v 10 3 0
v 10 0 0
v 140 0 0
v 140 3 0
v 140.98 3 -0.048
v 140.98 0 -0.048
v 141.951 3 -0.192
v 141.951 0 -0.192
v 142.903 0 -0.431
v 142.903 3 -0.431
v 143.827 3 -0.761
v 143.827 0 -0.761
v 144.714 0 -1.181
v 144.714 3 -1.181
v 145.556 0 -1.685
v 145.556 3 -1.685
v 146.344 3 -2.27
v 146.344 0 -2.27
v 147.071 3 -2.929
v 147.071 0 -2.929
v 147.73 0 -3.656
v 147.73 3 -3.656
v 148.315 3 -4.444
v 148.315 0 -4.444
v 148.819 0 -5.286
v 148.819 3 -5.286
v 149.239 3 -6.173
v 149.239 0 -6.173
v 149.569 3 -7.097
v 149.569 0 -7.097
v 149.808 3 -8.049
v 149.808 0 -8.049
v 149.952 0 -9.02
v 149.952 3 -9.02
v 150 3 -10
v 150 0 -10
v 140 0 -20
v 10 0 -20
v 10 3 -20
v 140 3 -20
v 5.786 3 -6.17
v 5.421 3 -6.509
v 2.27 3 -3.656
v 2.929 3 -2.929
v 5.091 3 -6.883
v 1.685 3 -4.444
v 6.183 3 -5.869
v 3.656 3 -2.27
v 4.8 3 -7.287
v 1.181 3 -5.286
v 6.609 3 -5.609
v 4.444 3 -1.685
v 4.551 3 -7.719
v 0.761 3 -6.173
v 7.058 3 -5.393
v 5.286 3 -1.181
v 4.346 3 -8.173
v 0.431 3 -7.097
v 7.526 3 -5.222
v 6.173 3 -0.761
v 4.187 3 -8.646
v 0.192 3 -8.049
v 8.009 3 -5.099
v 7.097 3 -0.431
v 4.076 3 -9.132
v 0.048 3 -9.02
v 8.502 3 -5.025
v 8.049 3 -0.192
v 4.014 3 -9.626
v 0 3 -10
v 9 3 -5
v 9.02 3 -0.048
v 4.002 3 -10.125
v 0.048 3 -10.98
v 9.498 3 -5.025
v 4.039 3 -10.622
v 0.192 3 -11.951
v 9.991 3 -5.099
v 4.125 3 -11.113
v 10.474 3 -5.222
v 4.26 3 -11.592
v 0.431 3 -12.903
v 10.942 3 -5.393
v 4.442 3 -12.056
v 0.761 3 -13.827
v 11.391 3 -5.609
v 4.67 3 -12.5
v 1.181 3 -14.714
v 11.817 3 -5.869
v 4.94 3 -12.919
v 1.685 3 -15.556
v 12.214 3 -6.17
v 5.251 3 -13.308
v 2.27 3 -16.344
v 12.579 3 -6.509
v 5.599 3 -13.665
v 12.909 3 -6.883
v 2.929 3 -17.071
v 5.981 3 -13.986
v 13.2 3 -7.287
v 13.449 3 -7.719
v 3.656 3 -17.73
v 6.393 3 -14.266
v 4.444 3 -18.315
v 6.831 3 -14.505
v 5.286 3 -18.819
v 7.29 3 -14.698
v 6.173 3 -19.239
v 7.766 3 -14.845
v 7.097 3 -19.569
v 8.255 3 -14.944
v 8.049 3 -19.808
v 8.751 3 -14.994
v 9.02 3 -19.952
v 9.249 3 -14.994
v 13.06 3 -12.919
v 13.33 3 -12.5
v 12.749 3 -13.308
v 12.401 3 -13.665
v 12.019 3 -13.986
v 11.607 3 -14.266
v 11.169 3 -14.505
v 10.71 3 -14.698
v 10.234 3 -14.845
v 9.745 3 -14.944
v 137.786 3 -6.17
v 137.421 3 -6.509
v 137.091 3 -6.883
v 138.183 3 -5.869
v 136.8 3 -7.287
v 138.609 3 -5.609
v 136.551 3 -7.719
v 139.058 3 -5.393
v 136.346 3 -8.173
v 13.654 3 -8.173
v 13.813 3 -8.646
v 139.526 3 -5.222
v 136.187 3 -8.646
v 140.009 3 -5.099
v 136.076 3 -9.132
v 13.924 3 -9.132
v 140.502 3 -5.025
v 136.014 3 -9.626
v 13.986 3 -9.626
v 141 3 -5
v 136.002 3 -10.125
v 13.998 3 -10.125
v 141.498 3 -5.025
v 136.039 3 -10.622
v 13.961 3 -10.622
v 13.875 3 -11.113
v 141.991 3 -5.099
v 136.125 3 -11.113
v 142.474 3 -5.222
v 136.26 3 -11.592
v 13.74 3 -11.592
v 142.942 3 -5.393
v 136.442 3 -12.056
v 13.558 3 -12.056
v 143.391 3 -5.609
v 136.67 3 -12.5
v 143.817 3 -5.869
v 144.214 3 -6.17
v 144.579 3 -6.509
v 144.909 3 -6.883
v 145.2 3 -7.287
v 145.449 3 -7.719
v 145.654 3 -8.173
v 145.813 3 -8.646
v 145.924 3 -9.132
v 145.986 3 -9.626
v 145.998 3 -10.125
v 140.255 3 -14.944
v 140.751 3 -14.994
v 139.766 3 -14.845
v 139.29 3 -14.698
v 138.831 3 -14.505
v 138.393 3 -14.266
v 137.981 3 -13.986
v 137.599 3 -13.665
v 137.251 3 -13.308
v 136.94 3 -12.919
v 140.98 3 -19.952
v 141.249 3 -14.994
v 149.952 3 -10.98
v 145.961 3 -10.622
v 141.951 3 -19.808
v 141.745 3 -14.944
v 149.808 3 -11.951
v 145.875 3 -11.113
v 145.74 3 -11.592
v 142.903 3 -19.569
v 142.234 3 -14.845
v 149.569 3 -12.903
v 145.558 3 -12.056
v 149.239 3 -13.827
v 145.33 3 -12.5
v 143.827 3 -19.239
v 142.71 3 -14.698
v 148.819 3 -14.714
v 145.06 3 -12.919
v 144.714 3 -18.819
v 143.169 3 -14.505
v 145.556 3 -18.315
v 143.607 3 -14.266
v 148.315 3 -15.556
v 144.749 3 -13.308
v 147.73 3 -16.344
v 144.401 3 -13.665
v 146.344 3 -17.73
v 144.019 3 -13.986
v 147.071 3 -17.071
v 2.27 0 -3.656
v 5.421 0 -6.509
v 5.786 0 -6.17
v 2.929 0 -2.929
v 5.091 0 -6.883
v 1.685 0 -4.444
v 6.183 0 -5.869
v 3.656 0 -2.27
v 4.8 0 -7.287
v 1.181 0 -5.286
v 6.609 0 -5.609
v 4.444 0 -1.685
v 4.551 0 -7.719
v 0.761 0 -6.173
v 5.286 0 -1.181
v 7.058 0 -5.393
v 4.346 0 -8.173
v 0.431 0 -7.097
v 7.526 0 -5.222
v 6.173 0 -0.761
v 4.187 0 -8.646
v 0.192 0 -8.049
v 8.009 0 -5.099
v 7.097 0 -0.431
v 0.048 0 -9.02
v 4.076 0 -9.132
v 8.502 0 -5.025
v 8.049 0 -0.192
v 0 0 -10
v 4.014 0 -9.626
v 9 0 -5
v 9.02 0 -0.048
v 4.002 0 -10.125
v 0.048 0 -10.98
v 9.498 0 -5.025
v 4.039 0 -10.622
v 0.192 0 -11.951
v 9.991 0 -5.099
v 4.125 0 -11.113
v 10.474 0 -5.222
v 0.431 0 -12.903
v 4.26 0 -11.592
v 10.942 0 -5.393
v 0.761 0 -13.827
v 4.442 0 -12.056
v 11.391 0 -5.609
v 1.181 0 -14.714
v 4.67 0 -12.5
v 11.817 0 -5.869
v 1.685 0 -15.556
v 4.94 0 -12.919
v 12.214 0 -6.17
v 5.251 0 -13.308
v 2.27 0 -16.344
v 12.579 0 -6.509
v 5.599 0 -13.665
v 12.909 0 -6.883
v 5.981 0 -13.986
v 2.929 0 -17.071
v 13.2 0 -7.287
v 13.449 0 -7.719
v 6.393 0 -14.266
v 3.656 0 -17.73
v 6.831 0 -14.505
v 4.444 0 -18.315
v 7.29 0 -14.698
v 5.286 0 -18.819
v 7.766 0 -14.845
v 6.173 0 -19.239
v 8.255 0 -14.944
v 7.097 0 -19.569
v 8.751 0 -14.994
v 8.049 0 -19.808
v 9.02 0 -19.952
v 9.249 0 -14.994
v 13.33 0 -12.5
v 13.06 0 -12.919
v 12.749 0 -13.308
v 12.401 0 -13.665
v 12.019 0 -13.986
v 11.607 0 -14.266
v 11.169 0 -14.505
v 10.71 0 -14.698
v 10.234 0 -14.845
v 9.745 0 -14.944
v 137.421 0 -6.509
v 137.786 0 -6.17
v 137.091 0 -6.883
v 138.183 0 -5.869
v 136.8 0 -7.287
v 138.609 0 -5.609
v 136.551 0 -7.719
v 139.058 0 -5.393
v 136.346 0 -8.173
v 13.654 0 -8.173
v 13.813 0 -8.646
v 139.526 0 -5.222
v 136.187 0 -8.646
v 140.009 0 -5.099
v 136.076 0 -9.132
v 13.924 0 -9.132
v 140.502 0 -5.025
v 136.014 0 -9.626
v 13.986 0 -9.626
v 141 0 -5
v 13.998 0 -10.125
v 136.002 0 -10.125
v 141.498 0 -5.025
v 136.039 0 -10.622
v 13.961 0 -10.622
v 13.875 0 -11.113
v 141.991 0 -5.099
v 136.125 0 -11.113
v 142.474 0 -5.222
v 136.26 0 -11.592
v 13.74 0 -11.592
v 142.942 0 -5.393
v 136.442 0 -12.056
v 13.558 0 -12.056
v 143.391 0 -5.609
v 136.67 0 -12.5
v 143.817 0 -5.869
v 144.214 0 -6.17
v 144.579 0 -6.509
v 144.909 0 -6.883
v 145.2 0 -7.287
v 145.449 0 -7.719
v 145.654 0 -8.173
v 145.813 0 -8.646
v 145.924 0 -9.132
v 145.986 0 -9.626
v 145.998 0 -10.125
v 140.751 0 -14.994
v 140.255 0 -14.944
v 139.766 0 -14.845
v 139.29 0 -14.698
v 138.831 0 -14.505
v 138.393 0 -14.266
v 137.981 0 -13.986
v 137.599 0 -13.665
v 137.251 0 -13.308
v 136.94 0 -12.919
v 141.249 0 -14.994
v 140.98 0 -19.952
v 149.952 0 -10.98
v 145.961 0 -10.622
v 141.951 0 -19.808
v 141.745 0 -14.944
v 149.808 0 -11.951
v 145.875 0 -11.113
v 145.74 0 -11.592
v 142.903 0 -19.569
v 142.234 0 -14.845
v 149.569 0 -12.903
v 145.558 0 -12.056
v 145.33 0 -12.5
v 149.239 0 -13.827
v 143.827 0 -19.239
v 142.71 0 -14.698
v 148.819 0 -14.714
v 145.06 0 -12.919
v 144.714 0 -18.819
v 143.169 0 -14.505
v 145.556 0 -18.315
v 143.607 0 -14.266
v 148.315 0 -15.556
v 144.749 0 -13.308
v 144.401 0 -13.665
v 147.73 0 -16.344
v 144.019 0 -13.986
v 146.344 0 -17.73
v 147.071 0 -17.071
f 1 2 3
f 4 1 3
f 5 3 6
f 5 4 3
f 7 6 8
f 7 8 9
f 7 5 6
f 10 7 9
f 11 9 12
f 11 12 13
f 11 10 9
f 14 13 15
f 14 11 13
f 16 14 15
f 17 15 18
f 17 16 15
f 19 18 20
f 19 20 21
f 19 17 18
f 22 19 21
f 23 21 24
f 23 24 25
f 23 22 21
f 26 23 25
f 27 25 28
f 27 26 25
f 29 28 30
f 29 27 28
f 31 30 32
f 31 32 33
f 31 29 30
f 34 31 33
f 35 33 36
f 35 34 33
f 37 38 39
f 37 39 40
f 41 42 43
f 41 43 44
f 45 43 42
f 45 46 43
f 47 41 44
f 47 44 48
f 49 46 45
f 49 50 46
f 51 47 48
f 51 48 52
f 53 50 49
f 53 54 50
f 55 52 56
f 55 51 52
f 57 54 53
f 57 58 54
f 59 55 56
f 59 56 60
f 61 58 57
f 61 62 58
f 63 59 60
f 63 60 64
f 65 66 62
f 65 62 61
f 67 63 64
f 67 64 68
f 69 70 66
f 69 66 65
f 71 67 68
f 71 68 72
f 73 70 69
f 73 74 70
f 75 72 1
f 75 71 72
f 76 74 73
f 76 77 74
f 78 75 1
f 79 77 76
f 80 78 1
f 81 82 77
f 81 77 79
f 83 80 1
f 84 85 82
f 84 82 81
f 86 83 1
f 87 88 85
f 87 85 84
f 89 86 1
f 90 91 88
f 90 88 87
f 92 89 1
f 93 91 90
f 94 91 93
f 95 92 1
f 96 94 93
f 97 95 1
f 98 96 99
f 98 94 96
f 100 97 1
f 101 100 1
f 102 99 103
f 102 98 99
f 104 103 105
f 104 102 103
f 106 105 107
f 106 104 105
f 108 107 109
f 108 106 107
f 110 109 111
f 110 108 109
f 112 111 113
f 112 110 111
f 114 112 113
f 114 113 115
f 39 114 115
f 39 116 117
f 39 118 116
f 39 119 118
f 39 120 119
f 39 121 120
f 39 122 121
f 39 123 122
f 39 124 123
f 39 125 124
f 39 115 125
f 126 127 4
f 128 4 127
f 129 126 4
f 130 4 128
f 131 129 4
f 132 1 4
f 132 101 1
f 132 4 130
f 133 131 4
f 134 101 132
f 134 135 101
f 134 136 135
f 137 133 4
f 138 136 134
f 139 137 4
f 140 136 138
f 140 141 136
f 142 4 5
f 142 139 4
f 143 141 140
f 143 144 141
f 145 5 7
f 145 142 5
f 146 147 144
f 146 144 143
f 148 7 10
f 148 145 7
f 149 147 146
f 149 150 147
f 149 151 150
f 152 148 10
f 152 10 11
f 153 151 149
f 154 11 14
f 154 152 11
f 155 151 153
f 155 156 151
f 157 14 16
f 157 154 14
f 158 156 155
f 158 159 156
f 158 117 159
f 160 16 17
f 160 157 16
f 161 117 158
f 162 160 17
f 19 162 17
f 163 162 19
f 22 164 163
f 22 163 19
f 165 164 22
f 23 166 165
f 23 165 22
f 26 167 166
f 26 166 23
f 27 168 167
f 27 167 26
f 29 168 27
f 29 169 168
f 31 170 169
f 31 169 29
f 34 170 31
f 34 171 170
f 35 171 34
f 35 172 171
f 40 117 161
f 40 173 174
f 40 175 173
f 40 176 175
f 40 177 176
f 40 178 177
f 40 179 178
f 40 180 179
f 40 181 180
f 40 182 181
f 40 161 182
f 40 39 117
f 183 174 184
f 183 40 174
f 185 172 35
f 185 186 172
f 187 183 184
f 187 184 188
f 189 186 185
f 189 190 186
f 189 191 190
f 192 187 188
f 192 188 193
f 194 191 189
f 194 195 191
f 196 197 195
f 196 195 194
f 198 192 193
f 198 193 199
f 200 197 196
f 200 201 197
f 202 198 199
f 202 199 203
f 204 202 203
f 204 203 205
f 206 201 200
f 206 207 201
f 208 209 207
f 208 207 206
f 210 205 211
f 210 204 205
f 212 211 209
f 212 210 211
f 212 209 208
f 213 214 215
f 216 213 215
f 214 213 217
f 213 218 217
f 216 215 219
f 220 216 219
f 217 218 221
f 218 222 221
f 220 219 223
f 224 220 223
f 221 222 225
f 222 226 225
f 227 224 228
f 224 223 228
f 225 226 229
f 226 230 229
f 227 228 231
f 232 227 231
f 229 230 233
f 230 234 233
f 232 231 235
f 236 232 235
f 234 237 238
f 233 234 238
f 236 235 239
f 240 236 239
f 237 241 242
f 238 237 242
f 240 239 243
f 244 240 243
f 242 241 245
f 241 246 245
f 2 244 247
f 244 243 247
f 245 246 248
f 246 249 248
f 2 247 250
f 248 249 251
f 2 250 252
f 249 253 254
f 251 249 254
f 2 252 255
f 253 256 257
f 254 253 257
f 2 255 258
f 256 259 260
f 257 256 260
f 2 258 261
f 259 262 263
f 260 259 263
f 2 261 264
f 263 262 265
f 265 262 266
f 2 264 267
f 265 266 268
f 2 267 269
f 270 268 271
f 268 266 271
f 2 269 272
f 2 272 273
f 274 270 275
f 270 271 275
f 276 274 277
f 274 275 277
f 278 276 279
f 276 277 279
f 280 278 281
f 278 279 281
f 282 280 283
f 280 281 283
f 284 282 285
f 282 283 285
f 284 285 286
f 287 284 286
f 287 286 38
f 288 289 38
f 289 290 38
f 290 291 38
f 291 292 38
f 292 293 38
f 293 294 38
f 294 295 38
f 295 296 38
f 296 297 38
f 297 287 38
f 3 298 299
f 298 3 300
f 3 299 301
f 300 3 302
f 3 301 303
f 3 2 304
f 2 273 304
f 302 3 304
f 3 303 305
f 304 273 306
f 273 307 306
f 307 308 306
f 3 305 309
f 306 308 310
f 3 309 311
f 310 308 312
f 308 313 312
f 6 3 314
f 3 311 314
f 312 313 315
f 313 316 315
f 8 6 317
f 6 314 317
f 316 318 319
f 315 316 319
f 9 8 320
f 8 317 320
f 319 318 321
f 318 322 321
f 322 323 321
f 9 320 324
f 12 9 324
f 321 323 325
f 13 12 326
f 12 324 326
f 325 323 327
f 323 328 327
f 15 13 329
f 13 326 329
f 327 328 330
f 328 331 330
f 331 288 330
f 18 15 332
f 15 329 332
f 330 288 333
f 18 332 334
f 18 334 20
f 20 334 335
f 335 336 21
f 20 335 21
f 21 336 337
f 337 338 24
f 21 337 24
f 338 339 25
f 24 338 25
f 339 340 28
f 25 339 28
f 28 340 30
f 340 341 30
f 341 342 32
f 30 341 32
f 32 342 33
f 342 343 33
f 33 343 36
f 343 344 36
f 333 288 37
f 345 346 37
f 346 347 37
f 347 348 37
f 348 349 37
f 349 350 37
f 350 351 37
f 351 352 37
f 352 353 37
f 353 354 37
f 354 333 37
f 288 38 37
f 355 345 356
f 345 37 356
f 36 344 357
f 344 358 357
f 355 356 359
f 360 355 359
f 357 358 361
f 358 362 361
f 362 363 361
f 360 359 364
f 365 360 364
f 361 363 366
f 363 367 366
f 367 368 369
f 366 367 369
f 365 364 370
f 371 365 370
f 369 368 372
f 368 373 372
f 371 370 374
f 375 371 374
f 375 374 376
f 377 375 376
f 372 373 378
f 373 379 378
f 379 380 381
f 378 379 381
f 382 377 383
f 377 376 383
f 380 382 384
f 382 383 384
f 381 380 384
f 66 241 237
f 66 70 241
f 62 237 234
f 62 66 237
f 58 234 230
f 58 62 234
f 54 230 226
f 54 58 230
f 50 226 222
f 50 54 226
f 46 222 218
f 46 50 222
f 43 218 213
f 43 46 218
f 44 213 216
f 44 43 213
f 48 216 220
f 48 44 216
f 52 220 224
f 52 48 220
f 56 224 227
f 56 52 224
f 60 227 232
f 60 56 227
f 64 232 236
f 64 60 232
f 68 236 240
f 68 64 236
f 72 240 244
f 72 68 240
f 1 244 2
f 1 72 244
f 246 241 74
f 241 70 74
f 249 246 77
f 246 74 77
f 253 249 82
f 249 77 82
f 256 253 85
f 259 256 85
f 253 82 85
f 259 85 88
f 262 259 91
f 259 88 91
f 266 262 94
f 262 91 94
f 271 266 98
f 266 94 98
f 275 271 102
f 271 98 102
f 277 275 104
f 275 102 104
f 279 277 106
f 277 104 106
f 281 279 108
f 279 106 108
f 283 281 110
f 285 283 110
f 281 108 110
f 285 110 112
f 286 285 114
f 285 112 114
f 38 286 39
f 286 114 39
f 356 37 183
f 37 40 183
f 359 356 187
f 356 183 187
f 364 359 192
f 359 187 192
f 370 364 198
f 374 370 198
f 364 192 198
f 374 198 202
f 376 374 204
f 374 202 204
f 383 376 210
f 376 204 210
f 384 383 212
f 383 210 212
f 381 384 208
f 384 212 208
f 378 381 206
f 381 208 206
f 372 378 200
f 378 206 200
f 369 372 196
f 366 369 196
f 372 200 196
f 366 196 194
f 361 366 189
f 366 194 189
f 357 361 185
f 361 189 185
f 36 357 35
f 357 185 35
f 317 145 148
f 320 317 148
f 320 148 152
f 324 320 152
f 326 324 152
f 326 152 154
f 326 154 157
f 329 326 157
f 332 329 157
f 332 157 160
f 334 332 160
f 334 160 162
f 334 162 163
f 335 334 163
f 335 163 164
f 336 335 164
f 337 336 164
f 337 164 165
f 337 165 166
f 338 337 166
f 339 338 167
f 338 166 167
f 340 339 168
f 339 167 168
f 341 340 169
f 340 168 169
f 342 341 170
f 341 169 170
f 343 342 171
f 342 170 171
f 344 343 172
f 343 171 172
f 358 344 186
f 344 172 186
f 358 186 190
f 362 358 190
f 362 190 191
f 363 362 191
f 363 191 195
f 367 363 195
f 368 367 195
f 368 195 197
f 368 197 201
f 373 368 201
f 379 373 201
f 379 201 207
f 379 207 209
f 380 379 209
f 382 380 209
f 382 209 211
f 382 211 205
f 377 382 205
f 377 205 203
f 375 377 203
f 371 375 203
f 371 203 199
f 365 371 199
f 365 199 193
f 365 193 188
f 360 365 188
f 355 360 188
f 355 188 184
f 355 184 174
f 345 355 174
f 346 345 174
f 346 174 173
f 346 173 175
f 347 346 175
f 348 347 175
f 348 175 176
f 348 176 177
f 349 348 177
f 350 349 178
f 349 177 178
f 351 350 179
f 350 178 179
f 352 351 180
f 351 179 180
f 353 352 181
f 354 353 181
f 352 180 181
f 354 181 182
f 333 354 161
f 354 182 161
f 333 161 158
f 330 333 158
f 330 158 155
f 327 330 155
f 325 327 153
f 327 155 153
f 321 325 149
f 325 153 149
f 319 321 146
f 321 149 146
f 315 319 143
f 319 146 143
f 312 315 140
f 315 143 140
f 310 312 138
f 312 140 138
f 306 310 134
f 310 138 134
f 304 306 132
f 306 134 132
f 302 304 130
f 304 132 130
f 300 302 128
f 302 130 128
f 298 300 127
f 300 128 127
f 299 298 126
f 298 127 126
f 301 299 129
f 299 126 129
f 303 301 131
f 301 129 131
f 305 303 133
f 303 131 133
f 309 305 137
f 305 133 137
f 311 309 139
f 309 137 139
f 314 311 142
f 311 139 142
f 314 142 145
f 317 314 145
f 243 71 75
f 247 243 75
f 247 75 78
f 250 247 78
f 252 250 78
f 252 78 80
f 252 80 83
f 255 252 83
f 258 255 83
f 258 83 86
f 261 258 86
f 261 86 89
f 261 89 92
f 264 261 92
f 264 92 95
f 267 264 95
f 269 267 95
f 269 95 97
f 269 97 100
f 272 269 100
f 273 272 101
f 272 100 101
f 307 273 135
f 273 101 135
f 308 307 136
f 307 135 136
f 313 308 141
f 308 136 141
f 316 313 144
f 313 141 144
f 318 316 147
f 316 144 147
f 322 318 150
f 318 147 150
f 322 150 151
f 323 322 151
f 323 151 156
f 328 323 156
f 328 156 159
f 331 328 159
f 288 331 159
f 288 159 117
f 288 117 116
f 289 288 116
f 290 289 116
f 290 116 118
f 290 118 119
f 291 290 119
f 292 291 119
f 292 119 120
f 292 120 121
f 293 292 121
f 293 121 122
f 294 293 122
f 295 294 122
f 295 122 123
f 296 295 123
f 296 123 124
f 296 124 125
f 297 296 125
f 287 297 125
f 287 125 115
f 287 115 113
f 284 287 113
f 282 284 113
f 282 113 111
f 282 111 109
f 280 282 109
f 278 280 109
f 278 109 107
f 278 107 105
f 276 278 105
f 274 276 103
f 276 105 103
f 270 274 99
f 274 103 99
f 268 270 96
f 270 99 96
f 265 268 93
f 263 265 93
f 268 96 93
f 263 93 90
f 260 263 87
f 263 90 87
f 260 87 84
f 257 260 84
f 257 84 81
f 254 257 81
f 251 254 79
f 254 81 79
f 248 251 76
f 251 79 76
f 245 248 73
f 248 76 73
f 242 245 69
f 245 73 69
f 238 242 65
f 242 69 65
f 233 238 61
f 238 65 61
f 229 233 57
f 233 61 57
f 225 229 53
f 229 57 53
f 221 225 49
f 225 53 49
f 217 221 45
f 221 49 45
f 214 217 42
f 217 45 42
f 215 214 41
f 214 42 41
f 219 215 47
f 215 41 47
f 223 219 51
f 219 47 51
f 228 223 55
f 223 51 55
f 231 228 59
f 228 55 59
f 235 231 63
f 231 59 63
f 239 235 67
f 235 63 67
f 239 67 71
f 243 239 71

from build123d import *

# Parameters (mm, degrees)
SKETCH2_W           = 150
SKETCH2_H           = 20
BOSS_EXTRUDE1_DEPTH = 3
SKETCH3_R           = 5
CUT_EXTRUDE1_DEPTH  = 152.35719342
SKETCH4_R           = 5
CUT_EXTRUDE2_DEPTH  = 152.35719342
FILLET1_R           = 10
FILLET2_R           = 10


with BuildPart() as part:
    # Sketch2 → Boss-Extrude1 (new body)
    with BuildSketch(Plane(origin=(0, 0, 0), x_dir=(1, 0, 0), z_dir=(0, 1, 0))):
        with Locations((75, 10)):
            Rectangle(SKETCH2_W, SKETCH2_H)
    extrude(amount=BOSS_EXTRUDE1_DEPTH)

    # Sketch3 → Cut-Extrude1 (cut, through all)
    with BuildSketch(Plane(origin=(0, 3, 0), x_dir=(1, 0, 0), z_dir=(0, 1, 0))):
        with Locations(Location((9, 10, 0), (0, 0, 270))):
            Circle(SKETCH3_R)
    extrude(amount=-CUT_EXTRUDE1_DEPTH, mode=Mode.SUBTRACT)

    # Sketch4 → Cut-Extrude2 (cut, through all)
    with BuildSketch(Plane(origin=(0, 3, 0), x_dir=(1, 0, 0), z_dir=(0, 1, 0))):
        with Locations(Location((141, 10, 0), (0, 0, 270))):
            Circle(SKETCH4_R)
    extrude(amount=-CUT_EXTRUDE2_DEPTH, mode=Mode.SUBTRACT)

    # Fillet1
    fillet1_edges = [part.edges().sort_by_distance(p)[0] for p in [
        (0, 1.5, -20),
        (0, 1.5, 0),
    ]]
    fillet(fillet1_edges, radius=FILLET1_R - 0.0001)  # a hair under: the kernel refuses the full size

    # Fillet2
    fillet2_edges = [part.edges().sort_by_distance(p)[0] for p in [
        (150, 1.5, -20),
        (150, 1.5, 0),
    ]]
    fillet(fillet2_edges, radius=FILLET2_R - 0.0001)  # a hair under: the kernel refuses the full size


solid = part.part
